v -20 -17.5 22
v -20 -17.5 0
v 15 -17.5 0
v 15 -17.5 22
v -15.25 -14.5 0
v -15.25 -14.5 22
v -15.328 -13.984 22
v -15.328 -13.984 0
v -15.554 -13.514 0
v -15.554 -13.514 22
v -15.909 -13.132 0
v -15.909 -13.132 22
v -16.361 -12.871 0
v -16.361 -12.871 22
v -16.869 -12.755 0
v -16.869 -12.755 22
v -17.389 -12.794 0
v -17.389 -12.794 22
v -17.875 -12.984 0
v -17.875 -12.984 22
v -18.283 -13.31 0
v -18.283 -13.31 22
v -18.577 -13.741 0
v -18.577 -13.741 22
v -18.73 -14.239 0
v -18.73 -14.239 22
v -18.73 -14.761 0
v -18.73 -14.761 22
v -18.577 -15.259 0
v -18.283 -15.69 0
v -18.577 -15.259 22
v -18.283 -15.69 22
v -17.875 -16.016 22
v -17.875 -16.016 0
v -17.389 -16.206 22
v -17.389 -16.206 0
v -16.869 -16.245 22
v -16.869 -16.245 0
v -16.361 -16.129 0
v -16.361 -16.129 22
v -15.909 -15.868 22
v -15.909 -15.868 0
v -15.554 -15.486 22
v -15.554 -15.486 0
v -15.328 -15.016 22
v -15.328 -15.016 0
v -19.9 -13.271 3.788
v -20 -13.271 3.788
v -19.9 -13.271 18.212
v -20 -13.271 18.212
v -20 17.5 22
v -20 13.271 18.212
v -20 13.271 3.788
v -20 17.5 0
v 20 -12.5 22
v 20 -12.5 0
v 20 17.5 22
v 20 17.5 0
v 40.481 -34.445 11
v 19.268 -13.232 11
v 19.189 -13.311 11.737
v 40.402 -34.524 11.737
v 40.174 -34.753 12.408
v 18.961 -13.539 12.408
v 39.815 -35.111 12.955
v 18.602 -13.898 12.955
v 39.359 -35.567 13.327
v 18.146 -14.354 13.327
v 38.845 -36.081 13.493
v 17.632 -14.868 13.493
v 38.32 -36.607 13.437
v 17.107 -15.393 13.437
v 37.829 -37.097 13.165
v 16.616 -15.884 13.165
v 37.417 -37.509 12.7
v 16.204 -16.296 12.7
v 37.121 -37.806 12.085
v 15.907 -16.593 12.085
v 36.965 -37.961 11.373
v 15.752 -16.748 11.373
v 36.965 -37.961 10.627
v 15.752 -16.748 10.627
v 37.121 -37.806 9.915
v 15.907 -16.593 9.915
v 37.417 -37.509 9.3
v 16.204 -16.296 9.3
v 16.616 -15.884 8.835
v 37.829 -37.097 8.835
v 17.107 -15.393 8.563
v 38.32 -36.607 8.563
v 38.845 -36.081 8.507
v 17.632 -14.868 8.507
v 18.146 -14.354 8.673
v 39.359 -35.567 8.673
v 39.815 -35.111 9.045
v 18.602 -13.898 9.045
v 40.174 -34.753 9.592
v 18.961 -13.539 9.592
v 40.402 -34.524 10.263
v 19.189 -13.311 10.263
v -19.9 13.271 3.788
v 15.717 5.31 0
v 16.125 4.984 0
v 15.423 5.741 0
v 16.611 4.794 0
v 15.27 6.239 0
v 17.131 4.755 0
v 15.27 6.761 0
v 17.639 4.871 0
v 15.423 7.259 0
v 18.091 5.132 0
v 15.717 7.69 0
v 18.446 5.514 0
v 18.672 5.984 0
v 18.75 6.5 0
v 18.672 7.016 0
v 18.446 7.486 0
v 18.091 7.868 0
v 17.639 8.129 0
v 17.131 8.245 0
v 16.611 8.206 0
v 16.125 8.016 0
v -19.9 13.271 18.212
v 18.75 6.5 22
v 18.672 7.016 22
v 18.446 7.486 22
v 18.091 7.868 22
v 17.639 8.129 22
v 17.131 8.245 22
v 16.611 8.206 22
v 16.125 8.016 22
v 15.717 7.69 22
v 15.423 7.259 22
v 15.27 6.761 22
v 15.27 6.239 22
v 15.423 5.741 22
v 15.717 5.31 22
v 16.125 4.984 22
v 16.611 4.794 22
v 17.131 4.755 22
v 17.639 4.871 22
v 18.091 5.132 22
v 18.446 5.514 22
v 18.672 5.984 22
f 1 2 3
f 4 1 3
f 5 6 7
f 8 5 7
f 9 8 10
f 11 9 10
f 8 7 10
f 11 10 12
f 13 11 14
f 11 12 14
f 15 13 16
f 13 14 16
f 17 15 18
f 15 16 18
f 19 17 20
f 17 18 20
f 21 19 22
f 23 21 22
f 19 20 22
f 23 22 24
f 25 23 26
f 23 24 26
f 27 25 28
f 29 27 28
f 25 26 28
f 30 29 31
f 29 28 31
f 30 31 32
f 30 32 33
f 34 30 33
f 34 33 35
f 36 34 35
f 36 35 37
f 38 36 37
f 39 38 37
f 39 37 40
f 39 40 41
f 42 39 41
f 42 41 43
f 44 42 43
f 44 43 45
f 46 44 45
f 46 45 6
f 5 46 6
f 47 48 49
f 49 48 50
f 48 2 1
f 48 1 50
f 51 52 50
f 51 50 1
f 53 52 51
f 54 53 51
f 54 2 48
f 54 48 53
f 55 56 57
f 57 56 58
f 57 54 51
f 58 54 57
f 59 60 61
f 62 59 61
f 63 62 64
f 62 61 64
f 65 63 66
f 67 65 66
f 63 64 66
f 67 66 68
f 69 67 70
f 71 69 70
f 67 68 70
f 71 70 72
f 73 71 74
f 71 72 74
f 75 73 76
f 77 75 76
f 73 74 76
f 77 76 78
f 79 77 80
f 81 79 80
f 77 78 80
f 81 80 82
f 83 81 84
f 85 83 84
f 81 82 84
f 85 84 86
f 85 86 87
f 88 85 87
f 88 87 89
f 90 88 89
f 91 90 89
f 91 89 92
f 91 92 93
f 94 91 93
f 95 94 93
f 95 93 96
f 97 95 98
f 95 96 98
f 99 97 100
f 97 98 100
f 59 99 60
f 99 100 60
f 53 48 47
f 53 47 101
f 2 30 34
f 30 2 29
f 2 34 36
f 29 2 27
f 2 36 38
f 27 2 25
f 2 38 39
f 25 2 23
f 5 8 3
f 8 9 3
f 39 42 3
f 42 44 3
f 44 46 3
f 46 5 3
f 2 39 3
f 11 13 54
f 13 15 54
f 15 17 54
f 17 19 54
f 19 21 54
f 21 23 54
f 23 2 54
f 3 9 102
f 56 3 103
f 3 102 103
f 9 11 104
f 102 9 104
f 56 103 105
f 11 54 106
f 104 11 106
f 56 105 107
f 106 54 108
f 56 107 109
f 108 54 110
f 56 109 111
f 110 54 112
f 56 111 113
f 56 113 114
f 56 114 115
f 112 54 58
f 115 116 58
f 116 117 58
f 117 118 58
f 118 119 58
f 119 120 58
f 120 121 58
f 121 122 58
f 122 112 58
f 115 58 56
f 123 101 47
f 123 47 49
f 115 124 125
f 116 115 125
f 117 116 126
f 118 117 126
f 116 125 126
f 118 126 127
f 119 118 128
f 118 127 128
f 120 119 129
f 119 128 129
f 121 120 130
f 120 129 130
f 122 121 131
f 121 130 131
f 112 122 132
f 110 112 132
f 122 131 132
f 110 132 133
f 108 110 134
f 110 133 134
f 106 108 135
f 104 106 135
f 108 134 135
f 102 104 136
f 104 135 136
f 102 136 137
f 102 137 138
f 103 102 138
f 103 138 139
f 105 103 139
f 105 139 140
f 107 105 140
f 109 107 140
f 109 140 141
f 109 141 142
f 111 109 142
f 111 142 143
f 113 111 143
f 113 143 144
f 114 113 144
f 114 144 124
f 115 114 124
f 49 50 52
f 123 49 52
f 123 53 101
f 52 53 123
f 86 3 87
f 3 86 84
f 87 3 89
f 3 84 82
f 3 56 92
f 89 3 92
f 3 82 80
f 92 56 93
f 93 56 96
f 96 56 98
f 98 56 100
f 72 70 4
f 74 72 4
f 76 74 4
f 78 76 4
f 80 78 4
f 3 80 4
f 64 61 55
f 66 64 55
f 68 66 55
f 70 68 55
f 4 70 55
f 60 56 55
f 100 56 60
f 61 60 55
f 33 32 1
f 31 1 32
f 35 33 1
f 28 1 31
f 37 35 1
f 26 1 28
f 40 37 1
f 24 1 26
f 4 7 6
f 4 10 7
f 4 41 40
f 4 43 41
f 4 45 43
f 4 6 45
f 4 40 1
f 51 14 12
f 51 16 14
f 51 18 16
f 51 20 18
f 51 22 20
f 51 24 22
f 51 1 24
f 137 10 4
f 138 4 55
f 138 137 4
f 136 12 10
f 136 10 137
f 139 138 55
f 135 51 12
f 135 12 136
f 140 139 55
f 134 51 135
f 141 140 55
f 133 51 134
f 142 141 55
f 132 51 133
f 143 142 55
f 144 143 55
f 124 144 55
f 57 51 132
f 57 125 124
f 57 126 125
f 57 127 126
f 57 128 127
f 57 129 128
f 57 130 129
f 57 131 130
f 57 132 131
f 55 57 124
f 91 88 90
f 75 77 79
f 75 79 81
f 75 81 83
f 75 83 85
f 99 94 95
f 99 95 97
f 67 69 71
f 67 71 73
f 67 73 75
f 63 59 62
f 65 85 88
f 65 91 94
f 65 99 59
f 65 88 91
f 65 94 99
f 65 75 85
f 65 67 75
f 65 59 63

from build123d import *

# Parameters (mm, degrees)
SKETCH_1_W          = 40
SKETCH_1_H          = 35
EXTRUDE_1_DEPTH     = 22
SKETCH_2_R          = 1.75
CUT_EXTRUDE_1_DEPTH = 35.5
CHAMFER_1_SIZE      = 5
SKETCH_3_R          = 2.5
EXTRUDE_2_DEPTH     = 30
SKETCH_4_W          = 14.42354322
SKETCH_4_H          = 26.54144869
CUT_EXTRUDE_2_DEPTH = 0.1


with BuildPart() as part:
    # 草图1 → 凸台-拉伸1 (new body)
    with BuildSketch(Plane.XY):
        Rectangle(SKETCH_1_W, SKETCH_1_H)
    extrude(amount=EXTRUDE_1_DEPTH)

    # 草图2 → 切除-拉伸1 (cut, through all)
    with BuildSketch(Plane.XY.offset(22)):
        with Locations((17, 6.5)):
            Circle(SKETCH_2_R)
        with Locations((-17, -14.5)):
            Circle(SKETCH_2_R)
    extrude(amount=-CUT_EXTRUDE_1_DEPTH, mode=Mode.SUBTRACT)

    # 倒角1
    chamfer_1_edges = [part.edges().sort_by_distance(p)[0] for p in [
        (20, -17.5, 11),
    ]]
    chamfer(chamfer_1_edges, length=CHAMFER_1_SIZE)

    # 草图3 → 凸台-拉伸2 (add)
    with BuildSketch(Plane(origin=(16.25, -16.25, 0), x_dir=(0, 0, -1), z_dir=(0.7071067811865467, -0.7071067811865485, 0))):
        with Locations(Location((-11, 1.767766953, 0), (0, 0, 90))):
            Circle(SKETCH_3_R)
    extrude(amount=EXTRUDE_2_DEPTH)

    # 草图4 → 切除-拉伸2 (cut)
    with BuildSketch(Plane.ZY.offset(20)):
        with Locations((11, 0)):
            Rectangle(SKETCH_4_W, SKETCH_4_H)
    extrude(amount=-CUT_EXTRUDE_2_DEPTH, mode=Mode.SUBTRACT)


solid = part.part
